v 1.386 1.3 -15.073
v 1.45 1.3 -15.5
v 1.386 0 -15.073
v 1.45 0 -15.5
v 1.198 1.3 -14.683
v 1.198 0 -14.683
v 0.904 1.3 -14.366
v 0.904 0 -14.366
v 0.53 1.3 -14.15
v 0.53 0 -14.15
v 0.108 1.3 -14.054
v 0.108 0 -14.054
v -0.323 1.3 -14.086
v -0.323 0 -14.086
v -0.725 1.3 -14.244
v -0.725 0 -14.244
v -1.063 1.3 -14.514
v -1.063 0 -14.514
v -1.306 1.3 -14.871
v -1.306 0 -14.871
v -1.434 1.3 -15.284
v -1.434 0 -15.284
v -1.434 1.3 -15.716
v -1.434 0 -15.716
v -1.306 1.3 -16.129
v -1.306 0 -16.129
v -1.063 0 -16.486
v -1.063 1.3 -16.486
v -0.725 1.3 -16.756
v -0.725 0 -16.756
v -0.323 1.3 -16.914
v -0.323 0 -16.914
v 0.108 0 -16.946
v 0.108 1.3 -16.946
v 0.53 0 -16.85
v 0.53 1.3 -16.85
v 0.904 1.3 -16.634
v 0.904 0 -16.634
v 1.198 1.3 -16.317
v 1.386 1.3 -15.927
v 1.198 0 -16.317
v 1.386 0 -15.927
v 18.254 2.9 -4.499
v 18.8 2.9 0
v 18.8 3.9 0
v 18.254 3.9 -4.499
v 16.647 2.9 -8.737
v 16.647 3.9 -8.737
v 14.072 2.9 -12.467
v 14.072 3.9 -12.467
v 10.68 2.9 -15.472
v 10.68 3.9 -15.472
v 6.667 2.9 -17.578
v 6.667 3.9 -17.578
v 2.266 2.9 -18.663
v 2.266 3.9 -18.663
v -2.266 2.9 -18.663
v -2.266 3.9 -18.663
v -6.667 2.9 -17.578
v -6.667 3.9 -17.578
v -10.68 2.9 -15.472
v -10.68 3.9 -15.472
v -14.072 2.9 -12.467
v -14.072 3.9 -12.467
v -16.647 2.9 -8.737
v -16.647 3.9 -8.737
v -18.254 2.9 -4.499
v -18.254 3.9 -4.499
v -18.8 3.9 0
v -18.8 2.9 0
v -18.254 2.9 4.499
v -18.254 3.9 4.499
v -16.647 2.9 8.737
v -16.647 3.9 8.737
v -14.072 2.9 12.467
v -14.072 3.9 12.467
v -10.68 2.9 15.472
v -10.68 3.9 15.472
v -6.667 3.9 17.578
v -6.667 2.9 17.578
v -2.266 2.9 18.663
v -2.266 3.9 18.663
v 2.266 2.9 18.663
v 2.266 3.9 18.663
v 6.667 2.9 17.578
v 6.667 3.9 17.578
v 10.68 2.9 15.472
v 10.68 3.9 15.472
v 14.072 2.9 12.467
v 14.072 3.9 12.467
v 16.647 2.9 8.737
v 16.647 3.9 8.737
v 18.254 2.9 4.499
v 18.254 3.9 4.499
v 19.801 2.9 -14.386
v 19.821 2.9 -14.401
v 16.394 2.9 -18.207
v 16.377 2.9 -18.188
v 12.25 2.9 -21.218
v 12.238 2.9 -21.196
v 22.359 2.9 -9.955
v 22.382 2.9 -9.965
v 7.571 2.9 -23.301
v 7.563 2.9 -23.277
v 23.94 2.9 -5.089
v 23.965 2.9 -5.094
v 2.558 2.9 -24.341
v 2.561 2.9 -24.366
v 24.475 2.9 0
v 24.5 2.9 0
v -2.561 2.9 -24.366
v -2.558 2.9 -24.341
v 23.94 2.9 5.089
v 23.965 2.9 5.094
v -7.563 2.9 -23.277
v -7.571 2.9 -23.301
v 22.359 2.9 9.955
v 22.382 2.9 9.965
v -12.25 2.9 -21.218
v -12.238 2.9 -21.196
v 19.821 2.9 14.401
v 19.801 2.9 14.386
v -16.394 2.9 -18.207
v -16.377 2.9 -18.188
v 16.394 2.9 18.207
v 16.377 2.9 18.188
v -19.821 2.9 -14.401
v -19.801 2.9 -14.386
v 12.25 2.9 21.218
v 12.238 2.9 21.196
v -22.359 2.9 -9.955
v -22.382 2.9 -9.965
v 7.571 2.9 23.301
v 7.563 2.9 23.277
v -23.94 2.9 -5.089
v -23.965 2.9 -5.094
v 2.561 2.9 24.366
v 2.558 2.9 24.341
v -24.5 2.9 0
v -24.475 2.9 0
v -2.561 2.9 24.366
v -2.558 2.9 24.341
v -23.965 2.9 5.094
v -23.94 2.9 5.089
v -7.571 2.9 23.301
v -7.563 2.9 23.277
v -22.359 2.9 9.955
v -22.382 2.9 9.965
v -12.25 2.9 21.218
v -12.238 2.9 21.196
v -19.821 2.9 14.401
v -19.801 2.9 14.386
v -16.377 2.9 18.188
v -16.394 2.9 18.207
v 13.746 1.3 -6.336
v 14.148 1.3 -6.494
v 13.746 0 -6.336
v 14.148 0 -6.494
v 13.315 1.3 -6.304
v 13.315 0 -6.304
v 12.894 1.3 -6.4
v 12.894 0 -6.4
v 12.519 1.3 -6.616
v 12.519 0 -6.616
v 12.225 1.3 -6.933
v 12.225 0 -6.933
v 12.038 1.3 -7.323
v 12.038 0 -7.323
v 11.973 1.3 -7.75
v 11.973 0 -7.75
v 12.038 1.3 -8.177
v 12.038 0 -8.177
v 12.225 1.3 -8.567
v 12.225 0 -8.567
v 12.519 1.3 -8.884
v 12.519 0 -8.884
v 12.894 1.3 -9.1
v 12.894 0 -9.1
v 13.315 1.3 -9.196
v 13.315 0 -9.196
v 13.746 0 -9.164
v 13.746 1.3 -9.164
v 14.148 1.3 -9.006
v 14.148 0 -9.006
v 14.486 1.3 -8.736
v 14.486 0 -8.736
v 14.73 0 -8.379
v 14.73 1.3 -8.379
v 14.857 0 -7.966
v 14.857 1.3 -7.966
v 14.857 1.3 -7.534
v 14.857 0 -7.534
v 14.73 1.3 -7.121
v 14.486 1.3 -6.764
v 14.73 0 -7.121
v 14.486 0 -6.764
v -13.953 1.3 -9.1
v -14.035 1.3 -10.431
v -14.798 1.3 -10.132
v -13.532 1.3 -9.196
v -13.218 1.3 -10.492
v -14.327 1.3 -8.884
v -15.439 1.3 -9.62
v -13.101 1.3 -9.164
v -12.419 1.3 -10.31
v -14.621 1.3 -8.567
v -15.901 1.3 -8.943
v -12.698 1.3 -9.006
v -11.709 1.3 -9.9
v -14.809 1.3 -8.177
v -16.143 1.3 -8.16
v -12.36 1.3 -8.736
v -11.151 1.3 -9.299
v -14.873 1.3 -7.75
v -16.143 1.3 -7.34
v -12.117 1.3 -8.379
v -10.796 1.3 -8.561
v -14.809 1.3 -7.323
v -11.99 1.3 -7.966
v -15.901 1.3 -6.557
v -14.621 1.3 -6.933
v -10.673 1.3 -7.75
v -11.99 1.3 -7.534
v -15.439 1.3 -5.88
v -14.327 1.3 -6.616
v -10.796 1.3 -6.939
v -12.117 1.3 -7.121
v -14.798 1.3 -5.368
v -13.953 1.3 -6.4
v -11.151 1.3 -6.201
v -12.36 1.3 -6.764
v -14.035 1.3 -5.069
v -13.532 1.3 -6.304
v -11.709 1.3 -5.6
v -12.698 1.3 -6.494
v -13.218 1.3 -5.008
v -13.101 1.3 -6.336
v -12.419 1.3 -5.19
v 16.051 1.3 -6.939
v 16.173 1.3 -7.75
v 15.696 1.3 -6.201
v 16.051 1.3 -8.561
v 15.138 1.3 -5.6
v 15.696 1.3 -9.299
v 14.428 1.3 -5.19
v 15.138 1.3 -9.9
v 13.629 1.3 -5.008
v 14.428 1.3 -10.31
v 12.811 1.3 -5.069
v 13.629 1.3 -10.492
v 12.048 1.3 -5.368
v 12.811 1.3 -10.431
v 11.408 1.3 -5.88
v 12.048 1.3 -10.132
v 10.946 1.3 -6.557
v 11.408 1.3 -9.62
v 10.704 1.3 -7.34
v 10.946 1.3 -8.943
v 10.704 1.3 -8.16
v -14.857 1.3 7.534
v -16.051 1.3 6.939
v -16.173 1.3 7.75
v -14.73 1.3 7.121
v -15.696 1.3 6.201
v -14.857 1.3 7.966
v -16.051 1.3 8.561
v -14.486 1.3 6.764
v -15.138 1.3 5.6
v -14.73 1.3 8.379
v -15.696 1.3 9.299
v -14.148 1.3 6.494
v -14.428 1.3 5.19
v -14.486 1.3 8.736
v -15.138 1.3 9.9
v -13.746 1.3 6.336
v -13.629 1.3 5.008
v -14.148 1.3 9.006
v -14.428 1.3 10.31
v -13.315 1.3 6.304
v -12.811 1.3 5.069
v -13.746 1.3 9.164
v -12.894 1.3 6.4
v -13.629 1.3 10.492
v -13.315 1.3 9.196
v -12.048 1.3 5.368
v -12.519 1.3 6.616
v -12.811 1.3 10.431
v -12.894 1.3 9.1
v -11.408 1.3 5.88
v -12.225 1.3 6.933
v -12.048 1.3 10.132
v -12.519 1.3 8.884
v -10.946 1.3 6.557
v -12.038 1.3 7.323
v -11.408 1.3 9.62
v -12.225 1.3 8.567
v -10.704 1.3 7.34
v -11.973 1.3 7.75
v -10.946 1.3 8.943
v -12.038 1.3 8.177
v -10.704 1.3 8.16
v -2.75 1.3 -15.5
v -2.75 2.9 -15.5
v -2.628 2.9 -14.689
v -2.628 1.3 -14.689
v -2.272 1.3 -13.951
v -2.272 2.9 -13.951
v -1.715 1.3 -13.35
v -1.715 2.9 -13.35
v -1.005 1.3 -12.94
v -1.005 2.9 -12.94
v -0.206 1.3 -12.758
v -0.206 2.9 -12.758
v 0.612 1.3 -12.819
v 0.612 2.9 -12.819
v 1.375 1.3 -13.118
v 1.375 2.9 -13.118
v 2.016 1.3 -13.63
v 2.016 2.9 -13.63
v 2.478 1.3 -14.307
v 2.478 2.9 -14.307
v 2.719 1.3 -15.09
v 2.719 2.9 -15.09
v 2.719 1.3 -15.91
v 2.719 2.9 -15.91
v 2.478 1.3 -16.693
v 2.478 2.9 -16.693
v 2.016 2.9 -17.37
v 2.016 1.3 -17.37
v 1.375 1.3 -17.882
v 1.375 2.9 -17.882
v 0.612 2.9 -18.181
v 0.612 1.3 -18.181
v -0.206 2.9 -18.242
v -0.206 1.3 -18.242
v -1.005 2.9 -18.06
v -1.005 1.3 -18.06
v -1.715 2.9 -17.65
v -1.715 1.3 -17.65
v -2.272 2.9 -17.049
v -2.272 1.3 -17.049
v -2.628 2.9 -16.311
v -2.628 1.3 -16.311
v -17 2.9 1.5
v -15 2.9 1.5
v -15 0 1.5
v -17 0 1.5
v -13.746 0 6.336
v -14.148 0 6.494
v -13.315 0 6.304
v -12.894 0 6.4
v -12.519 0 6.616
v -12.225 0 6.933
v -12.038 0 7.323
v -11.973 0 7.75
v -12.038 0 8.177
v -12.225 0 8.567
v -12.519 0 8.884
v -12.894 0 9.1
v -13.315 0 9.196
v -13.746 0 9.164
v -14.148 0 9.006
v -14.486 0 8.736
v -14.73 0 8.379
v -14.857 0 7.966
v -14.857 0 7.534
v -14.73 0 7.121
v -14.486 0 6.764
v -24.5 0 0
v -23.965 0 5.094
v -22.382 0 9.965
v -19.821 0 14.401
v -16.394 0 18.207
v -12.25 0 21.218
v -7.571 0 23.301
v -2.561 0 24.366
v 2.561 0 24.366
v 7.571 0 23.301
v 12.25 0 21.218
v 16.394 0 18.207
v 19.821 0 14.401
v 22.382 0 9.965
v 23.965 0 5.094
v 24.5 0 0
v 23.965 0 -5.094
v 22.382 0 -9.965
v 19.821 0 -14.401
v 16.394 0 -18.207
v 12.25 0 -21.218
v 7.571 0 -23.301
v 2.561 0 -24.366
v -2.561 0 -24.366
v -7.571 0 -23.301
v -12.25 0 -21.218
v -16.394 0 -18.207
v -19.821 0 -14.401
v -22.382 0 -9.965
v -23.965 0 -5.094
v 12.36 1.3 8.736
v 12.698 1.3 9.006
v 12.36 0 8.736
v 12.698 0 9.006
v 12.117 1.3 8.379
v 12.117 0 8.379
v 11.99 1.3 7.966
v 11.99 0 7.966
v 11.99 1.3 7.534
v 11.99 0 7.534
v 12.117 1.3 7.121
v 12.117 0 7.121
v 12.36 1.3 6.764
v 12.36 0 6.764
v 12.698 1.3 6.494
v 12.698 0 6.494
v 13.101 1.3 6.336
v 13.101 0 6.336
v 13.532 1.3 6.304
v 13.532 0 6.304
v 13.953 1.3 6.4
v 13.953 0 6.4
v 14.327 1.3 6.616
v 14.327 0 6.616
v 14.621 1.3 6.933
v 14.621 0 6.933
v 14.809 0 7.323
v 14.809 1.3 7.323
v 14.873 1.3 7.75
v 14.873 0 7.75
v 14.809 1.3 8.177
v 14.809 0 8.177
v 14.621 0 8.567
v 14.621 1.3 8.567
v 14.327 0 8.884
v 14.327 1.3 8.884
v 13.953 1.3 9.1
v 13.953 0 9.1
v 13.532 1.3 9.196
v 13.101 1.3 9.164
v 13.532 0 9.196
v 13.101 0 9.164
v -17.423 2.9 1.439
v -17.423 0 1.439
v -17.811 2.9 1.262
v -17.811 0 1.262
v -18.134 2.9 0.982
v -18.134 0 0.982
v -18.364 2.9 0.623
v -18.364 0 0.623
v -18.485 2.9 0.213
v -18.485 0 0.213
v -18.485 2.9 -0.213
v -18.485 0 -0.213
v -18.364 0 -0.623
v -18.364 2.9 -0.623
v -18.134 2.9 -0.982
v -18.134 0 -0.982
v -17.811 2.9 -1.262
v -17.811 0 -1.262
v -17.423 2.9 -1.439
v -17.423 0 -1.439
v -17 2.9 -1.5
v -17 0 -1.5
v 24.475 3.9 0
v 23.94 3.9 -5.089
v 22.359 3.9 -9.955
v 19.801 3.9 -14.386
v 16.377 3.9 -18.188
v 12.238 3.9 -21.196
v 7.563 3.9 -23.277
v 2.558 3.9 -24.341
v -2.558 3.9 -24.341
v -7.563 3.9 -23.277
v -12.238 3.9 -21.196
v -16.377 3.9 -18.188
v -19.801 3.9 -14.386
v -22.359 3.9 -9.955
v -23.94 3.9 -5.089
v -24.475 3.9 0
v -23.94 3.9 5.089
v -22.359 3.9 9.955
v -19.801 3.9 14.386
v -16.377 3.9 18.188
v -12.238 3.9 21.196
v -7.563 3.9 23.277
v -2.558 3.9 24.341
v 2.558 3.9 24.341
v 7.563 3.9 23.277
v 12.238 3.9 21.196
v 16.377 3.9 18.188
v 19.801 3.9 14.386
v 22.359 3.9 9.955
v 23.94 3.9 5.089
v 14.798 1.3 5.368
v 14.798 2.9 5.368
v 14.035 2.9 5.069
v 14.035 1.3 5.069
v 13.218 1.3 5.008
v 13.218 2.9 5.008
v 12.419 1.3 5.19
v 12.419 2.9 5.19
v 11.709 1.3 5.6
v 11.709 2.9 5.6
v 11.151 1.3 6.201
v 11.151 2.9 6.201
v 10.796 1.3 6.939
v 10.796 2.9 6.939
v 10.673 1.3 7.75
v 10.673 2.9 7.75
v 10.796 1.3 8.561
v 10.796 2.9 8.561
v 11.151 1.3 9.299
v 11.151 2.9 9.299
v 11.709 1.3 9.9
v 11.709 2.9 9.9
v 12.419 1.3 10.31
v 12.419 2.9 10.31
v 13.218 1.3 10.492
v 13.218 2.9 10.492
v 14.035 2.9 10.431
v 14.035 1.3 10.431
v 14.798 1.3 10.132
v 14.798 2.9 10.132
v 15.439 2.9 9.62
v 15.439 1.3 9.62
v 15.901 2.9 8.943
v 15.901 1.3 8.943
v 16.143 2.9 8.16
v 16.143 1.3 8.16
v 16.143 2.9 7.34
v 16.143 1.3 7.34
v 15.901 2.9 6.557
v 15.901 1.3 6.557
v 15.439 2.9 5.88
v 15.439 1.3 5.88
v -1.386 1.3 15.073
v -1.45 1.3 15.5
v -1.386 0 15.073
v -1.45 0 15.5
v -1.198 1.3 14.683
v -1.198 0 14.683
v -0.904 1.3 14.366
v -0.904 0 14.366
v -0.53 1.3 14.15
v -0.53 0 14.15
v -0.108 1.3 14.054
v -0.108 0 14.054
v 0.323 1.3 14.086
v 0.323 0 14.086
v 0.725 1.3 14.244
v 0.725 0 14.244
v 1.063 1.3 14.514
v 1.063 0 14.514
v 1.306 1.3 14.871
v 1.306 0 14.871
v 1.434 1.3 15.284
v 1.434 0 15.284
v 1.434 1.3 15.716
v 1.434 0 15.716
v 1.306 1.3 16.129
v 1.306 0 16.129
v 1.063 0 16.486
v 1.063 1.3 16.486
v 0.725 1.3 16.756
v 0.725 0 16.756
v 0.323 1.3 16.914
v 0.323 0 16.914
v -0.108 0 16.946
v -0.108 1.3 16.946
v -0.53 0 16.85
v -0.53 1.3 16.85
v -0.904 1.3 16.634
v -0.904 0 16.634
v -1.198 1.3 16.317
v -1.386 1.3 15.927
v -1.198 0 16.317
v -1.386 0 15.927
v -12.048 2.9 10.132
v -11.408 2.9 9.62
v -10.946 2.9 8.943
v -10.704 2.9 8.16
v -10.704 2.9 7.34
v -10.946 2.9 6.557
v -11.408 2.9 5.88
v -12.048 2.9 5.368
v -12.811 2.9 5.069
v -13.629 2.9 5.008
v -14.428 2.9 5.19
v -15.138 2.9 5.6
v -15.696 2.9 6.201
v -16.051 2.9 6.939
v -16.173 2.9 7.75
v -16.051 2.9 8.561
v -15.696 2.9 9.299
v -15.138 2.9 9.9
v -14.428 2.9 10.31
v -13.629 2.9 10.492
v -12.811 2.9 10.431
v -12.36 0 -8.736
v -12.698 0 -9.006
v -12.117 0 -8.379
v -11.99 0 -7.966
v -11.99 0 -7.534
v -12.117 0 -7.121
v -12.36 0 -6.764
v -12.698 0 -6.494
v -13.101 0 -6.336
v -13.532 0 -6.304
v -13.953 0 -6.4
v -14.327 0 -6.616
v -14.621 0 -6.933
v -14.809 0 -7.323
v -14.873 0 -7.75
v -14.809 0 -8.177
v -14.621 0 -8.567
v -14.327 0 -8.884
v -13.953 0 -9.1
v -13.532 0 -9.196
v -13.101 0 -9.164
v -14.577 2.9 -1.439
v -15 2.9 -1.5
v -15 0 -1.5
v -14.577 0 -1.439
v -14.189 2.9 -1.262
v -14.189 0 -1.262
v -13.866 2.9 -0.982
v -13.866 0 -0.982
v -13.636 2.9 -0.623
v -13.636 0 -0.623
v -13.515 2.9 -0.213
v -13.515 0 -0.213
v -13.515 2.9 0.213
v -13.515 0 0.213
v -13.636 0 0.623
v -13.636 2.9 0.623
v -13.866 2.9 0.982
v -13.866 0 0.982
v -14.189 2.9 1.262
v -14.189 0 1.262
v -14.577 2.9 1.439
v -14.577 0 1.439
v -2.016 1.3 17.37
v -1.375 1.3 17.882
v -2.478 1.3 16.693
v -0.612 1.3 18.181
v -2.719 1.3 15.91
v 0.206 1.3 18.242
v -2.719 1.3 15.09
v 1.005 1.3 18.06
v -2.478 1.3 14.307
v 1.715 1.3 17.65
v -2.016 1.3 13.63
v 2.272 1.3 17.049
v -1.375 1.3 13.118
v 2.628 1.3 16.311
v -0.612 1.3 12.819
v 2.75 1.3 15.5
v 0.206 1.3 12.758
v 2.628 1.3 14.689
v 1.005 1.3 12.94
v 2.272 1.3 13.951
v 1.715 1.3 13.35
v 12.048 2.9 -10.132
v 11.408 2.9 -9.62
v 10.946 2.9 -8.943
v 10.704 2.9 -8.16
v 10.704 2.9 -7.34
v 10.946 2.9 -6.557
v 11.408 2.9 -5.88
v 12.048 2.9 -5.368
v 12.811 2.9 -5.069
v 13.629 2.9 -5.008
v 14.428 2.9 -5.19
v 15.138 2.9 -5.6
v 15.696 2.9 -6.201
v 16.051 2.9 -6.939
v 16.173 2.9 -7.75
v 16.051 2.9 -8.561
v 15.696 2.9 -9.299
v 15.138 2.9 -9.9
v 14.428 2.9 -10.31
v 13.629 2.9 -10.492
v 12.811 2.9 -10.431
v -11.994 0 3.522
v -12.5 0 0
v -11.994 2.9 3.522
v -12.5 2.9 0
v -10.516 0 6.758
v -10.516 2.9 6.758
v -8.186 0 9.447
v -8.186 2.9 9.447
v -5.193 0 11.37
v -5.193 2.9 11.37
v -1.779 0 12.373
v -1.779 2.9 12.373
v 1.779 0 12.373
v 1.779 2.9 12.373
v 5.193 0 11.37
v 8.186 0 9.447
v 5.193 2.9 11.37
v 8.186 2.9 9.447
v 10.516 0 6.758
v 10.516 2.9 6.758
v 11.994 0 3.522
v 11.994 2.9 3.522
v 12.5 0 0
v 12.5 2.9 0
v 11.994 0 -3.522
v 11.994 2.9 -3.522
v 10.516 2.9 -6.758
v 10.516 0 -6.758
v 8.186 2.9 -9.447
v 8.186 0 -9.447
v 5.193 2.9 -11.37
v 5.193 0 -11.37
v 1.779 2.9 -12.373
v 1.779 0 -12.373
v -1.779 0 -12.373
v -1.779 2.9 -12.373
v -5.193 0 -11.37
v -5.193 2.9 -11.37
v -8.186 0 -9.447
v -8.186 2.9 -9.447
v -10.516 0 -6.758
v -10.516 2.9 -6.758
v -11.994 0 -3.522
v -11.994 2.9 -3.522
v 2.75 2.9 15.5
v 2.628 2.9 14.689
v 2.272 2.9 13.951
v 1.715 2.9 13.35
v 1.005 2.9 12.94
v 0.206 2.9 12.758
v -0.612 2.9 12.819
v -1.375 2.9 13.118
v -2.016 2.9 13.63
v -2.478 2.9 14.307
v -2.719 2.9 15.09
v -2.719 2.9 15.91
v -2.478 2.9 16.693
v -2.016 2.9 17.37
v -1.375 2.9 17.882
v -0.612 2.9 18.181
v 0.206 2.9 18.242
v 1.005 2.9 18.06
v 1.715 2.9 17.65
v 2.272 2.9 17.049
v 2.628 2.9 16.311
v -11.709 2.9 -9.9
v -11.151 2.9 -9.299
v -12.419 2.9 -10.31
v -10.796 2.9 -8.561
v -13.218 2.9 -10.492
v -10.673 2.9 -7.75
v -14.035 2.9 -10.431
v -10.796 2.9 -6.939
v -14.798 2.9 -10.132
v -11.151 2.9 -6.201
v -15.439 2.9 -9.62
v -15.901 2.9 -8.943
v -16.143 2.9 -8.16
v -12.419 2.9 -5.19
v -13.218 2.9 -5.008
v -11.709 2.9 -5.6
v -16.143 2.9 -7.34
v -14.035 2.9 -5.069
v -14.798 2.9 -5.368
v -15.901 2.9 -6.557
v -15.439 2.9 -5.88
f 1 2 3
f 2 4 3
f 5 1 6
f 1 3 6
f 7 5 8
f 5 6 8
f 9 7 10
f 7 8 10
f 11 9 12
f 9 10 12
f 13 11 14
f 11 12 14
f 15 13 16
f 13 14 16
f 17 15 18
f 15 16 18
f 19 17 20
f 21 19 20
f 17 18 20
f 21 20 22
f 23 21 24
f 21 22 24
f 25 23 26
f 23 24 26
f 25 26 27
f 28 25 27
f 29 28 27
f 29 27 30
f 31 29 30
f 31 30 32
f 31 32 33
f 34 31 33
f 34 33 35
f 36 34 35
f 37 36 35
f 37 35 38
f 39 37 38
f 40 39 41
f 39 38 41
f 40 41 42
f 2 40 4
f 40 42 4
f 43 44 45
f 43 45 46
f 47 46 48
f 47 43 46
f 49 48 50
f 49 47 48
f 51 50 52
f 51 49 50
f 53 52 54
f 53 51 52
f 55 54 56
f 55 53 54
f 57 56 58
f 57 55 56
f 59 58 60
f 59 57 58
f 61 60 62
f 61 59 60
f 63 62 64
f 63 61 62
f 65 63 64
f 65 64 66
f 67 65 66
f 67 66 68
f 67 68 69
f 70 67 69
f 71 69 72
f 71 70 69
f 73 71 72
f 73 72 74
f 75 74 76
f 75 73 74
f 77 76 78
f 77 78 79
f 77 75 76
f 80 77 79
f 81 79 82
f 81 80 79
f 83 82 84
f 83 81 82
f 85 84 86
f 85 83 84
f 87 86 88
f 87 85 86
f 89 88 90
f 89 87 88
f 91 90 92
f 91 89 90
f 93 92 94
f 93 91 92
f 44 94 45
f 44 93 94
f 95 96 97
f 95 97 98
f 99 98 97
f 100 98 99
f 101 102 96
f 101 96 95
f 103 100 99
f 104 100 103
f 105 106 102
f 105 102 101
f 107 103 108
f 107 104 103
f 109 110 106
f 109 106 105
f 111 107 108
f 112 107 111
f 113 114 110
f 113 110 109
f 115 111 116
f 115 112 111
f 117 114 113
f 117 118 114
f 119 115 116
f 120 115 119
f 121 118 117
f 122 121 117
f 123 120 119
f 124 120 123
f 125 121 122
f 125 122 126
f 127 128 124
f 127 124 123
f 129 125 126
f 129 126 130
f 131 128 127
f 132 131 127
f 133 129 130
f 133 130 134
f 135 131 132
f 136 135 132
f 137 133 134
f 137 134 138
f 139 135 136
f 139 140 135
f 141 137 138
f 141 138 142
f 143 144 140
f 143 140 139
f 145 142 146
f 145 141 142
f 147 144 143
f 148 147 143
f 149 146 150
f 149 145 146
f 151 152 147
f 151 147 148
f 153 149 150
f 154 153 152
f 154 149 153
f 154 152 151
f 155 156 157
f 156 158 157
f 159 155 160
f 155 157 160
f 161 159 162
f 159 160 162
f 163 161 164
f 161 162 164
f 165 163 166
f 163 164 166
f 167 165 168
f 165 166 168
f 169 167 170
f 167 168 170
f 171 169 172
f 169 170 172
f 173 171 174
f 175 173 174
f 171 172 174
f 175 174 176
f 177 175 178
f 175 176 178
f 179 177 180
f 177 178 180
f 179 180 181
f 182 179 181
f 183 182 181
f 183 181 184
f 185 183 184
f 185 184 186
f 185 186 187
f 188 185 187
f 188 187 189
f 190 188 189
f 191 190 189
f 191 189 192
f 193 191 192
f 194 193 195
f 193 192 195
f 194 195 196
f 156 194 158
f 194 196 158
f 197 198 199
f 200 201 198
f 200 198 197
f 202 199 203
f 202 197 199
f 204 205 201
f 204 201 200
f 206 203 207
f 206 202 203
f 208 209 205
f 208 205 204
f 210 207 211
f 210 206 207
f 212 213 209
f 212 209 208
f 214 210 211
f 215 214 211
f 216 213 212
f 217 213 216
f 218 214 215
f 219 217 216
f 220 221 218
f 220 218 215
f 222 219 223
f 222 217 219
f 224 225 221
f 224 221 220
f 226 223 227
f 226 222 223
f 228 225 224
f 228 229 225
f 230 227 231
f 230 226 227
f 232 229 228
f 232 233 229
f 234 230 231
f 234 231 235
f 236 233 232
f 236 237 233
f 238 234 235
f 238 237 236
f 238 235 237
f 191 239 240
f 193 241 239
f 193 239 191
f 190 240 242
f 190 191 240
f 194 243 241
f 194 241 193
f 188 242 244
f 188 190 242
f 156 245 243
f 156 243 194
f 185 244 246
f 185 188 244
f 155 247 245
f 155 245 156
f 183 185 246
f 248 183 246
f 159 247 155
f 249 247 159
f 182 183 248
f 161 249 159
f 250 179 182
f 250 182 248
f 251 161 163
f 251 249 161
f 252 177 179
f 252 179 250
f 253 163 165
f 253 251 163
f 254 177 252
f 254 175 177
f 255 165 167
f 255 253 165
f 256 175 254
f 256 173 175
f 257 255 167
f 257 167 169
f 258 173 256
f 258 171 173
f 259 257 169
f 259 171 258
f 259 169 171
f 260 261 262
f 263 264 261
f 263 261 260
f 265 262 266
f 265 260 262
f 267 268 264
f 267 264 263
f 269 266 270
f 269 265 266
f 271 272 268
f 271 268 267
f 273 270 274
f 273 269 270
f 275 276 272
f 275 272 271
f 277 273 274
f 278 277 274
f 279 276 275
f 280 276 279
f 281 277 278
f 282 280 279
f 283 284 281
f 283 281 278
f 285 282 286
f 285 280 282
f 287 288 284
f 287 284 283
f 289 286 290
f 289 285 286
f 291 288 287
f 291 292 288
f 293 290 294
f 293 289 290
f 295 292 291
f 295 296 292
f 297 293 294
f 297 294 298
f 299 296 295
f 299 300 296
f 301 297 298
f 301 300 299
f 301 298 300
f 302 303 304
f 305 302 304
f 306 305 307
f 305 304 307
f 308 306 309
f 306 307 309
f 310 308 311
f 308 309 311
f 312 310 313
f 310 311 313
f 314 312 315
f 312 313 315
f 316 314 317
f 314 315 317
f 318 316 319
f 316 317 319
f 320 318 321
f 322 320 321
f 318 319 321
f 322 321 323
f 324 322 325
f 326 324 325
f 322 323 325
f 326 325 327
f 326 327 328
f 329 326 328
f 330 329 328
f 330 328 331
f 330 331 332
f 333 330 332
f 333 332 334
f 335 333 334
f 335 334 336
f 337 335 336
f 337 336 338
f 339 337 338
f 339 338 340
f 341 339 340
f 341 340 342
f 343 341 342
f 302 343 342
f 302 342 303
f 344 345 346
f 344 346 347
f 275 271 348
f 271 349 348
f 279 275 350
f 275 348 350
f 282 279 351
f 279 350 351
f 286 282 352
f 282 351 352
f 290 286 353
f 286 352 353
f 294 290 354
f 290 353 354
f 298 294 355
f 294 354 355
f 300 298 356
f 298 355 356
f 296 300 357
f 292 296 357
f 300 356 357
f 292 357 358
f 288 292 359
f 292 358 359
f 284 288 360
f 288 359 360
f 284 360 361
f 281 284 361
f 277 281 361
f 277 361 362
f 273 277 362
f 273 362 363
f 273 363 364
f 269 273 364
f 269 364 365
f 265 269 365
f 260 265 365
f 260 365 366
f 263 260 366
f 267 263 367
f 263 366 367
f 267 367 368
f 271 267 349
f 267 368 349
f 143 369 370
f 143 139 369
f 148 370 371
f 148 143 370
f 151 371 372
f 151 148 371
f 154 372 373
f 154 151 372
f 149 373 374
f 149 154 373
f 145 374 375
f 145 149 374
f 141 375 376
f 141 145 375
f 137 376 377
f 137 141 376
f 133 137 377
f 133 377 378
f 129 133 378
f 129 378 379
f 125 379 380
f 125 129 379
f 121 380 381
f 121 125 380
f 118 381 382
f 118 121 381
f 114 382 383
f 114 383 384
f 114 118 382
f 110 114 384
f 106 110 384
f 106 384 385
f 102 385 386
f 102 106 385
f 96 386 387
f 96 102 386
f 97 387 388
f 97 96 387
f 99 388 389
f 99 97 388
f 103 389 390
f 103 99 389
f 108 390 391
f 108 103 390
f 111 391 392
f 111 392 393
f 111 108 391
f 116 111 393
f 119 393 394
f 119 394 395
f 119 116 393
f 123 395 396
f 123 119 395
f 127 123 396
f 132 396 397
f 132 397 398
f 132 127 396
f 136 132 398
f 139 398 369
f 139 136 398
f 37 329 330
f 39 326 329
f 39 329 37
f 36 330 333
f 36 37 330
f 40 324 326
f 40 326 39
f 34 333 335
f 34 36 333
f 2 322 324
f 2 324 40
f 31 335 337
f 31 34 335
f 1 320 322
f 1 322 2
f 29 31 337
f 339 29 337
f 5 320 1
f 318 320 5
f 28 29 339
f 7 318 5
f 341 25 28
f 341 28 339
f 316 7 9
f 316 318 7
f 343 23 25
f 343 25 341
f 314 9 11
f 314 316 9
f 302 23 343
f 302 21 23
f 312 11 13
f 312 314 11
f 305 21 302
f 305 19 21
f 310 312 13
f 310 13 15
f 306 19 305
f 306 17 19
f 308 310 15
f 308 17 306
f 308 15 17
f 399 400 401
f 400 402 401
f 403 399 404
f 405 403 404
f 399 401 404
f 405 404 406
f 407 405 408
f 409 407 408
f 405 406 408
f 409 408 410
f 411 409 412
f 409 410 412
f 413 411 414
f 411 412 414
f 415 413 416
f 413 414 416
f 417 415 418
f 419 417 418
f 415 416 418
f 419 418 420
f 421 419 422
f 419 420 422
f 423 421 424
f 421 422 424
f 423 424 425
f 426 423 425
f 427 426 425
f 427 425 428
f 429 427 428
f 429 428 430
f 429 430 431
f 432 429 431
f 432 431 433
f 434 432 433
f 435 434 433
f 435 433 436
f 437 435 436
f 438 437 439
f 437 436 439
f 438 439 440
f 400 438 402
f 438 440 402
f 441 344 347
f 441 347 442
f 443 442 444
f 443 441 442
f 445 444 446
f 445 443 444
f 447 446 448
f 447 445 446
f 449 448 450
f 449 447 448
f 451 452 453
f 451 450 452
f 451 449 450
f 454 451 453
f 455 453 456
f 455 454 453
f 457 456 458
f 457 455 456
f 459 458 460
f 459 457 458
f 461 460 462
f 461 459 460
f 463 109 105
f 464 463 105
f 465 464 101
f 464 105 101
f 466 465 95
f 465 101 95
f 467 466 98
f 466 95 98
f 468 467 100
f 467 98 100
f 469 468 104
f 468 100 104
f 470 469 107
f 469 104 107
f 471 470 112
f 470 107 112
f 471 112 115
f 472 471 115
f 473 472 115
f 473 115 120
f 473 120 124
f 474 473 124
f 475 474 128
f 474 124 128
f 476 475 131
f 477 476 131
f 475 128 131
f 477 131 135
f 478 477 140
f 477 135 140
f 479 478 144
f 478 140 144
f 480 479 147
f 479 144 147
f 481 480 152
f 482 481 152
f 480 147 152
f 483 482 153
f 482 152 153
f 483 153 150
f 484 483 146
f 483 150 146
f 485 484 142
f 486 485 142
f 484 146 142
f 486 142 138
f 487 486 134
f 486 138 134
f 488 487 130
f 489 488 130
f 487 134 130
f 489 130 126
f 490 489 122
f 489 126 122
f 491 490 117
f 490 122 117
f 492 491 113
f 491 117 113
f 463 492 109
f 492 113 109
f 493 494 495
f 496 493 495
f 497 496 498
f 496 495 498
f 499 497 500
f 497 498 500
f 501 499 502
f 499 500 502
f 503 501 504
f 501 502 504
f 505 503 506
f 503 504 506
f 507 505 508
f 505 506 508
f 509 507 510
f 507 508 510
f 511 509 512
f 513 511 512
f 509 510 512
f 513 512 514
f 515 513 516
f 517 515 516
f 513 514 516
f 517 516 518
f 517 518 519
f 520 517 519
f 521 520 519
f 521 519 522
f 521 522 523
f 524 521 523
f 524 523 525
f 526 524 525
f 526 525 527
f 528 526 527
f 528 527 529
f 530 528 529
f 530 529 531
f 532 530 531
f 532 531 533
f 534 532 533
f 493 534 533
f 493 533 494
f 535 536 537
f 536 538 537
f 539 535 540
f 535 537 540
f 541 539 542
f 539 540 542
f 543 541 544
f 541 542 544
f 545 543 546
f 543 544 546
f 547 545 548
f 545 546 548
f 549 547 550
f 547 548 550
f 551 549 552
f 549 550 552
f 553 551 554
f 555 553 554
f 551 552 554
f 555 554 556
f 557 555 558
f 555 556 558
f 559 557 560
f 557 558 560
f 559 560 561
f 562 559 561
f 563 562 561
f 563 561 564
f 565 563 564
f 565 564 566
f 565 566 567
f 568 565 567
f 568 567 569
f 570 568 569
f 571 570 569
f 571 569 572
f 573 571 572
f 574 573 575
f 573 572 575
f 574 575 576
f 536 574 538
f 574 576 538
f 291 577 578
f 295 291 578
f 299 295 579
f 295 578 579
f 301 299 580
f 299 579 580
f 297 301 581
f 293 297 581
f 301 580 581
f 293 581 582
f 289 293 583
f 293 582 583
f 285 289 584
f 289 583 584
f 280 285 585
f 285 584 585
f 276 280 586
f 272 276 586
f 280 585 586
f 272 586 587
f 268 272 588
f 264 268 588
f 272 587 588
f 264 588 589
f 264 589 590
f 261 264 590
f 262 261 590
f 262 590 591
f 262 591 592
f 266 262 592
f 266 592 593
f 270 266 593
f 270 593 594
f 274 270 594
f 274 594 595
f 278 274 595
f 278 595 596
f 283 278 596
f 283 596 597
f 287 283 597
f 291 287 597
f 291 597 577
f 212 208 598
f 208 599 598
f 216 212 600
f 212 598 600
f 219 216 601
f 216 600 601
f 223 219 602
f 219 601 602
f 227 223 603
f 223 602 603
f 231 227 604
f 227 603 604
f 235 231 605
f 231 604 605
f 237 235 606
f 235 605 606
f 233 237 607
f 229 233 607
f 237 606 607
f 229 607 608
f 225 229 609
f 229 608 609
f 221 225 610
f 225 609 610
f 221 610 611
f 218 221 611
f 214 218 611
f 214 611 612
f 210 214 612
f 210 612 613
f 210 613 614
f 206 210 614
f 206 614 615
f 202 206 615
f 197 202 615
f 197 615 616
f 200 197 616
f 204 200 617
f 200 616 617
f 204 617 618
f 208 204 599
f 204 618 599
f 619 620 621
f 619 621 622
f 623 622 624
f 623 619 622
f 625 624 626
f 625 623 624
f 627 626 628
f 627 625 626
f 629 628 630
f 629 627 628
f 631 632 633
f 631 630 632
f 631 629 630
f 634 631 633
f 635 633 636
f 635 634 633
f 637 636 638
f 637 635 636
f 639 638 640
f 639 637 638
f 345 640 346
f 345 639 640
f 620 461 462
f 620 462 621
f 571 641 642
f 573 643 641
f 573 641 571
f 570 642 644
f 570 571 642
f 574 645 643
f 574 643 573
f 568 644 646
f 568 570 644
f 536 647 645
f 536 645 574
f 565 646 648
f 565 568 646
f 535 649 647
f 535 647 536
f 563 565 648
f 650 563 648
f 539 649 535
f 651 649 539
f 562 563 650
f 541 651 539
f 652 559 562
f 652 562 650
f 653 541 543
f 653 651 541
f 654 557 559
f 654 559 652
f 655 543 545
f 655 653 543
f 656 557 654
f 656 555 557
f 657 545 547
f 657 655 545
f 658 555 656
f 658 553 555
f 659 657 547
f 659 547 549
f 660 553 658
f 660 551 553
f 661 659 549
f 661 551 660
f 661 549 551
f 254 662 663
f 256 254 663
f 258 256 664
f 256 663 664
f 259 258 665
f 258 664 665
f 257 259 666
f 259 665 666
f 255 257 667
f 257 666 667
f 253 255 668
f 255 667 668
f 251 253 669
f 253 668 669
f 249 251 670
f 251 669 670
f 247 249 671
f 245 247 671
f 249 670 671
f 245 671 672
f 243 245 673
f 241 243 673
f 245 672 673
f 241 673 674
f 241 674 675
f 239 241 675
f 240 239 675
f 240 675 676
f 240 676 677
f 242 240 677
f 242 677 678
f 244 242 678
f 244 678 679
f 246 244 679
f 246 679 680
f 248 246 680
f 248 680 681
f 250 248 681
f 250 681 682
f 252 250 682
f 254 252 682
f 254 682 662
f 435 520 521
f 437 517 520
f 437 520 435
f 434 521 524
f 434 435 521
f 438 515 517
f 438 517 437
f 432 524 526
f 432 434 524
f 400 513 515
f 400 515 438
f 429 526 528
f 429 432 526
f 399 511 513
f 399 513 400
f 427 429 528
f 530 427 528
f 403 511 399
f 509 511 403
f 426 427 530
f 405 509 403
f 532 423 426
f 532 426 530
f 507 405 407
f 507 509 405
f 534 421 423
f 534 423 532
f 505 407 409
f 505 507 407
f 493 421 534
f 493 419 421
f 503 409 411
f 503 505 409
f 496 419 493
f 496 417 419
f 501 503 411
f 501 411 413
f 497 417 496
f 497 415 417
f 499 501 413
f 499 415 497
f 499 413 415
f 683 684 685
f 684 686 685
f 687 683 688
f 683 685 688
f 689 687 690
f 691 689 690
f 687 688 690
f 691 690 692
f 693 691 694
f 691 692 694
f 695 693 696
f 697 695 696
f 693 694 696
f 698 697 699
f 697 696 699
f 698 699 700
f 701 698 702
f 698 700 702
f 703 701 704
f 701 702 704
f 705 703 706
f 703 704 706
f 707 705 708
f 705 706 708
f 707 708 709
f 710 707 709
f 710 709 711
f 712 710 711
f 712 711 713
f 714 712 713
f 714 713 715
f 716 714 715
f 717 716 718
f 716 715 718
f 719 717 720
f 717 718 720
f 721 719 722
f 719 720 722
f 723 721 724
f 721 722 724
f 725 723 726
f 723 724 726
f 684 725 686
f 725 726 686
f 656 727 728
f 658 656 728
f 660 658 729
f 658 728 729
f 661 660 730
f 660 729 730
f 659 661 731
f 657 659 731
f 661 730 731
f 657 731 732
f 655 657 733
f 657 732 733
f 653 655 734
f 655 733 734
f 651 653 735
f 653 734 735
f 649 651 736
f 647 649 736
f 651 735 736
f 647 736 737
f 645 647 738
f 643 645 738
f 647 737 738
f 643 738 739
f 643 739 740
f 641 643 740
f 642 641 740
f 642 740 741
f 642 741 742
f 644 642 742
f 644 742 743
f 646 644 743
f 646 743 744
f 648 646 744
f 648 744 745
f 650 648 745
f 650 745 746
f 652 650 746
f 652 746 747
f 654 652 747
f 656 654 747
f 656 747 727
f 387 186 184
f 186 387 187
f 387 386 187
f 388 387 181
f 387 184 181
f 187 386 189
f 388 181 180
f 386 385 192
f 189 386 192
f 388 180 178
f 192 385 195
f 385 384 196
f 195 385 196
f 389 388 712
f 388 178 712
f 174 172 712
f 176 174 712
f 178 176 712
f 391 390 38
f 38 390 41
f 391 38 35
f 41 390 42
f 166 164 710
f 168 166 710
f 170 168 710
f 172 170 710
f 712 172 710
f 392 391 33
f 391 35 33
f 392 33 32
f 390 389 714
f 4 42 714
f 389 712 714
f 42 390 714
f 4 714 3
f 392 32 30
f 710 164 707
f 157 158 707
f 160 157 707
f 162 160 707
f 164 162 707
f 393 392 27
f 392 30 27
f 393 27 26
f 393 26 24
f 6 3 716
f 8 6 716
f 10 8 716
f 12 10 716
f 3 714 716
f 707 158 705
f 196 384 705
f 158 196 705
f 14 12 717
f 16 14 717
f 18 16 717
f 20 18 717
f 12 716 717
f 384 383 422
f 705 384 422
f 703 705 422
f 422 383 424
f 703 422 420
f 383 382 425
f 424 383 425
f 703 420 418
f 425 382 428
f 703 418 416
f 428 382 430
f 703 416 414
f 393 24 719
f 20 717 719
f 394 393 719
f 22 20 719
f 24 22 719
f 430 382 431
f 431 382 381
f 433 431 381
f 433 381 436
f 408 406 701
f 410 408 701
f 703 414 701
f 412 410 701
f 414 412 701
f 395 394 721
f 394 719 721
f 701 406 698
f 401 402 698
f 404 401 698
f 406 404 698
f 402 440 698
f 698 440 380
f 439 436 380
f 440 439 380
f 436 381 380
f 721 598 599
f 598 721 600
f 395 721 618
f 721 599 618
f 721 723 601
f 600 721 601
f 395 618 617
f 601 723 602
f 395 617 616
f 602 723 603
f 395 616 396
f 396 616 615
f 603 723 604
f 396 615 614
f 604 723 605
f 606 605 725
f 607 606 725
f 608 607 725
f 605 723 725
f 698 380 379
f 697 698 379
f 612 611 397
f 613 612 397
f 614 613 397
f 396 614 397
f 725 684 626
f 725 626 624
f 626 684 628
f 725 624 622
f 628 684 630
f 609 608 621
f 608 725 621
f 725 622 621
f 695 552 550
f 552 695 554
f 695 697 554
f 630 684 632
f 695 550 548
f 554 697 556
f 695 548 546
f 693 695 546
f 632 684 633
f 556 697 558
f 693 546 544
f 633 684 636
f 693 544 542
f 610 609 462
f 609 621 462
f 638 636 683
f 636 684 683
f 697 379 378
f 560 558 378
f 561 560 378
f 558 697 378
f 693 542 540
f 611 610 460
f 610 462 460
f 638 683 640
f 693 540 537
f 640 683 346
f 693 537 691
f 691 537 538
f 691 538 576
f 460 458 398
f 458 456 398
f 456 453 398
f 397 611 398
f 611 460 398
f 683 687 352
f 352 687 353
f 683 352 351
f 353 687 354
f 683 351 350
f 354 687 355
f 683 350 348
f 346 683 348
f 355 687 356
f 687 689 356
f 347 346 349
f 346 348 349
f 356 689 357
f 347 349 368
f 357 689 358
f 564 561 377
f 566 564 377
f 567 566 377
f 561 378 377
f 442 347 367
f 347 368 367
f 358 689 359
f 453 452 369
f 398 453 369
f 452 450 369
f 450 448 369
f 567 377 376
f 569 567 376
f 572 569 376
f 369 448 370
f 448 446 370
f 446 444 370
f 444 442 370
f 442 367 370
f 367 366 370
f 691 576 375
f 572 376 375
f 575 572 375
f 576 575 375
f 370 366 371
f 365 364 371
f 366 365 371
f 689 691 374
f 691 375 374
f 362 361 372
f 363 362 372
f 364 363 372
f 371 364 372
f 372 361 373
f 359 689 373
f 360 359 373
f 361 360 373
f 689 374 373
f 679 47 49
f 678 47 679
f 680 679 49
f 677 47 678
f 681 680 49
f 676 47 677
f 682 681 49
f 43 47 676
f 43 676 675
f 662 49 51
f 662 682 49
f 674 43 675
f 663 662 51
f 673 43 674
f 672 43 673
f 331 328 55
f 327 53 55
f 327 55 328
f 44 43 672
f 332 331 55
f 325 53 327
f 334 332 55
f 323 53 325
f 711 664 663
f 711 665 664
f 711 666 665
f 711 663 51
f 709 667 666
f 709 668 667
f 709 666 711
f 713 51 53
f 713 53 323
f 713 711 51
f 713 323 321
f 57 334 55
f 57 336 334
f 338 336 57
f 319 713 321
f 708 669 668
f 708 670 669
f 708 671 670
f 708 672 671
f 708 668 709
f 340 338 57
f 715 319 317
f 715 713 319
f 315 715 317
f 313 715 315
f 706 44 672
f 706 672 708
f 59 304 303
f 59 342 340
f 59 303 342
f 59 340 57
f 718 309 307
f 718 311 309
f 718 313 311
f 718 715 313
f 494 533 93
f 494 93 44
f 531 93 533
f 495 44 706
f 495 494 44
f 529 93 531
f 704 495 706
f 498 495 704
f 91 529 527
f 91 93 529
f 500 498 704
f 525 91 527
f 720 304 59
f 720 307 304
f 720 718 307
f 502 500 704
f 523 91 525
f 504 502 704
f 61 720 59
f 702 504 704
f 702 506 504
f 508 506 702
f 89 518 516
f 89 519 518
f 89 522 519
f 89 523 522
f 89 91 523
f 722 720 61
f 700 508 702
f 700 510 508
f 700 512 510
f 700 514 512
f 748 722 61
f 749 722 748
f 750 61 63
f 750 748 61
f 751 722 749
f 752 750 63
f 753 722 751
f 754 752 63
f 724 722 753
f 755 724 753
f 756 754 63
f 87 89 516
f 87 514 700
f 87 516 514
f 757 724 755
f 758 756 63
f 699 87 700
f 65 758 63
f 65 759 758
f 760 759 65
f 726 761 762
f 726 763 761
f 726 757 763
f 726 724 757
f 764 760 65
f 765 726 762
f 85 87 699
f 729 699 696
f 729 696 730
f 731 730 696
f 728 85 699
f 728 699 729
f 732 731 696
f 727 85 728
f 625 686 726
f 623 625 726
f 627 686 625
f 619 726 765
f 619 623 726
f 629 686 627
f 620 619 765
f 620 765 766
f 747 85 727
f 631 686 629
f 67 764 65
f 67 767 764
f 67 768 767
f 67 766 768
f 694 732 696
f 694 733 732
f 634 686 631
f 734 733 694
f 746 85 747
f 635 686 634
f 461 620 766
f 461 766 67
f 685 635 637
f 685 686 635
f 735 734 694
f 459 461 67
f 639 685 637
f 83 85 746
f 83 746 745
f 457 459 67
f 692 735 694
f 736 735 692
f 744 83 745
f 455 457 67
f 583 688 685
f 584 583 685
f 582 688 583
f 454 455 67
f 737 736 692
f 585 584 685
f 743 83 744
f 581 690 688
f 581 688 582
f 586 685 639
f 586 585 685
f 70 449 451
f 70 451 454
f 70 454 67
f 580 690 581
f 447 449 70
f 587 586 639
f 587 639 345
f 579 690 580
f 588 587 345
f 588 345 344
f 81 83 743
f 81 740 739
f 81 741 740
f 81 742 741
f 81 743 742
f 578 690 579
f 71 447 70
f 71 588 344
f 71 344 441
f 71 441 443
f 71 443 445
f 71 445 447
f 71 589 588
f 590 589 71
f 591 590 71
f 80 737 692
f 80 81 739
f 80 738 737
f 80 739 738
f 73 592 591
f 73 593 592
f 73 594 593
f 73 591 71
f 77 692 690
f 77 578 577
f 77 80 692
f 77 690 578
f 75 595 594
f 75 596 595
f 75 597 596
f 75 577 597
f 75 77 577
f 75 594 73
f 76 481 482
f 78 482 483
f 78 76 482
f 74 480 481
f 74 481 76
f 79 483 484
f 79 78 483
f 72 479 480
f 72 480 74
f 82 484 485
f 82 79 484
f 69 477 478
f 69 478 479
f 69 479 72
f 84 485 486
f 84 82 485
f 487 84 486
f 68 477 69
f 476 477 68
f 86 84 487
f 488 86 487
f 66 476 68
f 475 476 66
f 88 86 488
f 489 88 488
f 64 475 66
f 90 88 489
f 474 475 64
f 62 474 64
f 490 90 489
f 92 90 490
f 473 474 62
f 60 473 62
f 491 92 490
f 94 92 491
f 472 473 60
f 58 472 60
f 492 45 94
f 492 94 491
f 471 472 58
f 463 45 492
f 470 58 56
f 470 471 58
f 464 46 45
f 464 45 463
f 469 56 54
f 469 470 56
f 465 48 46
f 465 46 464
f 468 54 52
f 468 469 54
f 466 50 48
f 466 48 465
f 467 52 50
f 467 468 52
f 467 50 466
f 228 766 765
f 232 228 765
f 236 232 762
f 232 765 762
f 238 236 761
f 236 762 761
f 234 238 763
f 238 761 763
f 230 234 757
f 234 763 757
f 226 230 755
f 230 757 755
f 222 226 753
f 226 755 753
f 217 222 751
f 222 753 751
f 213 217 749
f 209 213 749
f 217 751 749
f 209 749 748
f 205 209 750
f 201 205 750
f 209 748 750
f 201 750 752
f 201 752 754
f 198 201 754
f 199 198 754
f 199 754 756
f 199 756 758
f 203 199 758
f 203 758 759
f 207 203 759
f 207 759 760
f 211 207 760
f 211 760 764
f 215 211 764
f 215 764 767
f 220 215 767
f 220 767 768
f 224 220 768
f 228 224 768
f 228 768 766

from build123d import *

# Parameters (mm, degrees)
SKETCH1_W                                            = 12
SKETCH1_H                                            = 2.9
CBORE_FOR_M2_5_HEX_SOCKET_HEAD_CAP_SCREW_D           = 2.9
CBORE_FOR_M2_5_HEX_SOCKET_HEAD_CAP_SCREW_CBORE_D     = 5.5
CBORE_FOR_M2_5_HEX_SOCKET_HEAD_CAP_SCREW_CBORE_DEPTH = 2.1
CIRPATTERN1_COUNT                                    = 6
CUT_EXTRUDE4_DEPTH                                   = 3.9
SKETCH5_R                                            = 24.475
SKETCH5_R_2                                          = 18.8
BOSS_EXTRUDE1_DEPTH                                  = 1


with BuildPart() as part:
    # Sketch1 → Revolve1 (revolve)
    with BuildSketch(Plane.XY):
        with Locations((-18.5, 1.45)):
            Rectangle(SKETCH1_W, SKETCH1_H)
    revolve(axis=Axis((0, -3.243860323, 0), (0, 1, 0)))

    # CBORE for M2.5 Hex Socket Head Cap Screw2 (through all)
    with Locations(Plane(origin=(0, 3.4, 0), x_dir=(-1, 0, 0), z_dir=(0, 1, 0))):
        with Locations((0, -15.5)):
            cbore_for_m2_5_hex_socket_head_cap_screw = CounterBoreHole(CBORE_FOR_M2_5_HEX_SOCKET_HEAD_CAP_SCREW_D / 2, CBORE_FOR_M2_5_HEX_SOCKET_HEAD_CAP_SCREW_CBORE_D / 2, CBORE_FOR_M2_5_HEX_SOCKET_HEAD_CAP_SCREW_CBORE_DEPTH)

    # CirPattern1: CBORE for M2.5 Hex Socket Head Cap Screw2 ×6 about axis
    cirpattern1_axis = Axis((0, 0, 0), (0, 1, 0))
    for i in range(1, CIRPATTERN1_COUNT):
        add(cbore_for_m2_5_hex_socket_head_cap_screw.rotate(cirpattern1_axis, i * 360 / CIRPATTERN1_COUNT), mode=Mode.SUBTRACT)

    # Sketch10 → Cut-Extrude4 (cut, through all)
    with BuildSketch(Plane(origin=(0, 2.9, 0), x_dir=(1, 0, 0), z_dir=(0, 1, 0))):
        with BuildLine():
            Line((-15, -1.5), (-17, -1.5))
            ThreePointArc((-17, -1.5), (-18.5, 0), (-17, 1.5))
            Line((-17, 1.5), (-15, 1.5))
            ThreePointArc((-15, 1.5), (-13.5, 0), (-15, -1.5))
        make_face()
    extrude(amount=-CUT_EXTRUDE4_DEPTH, mode=Mode.SUBTRACT)

    # Sketch5 → Boss-Extrude1 (add)
    with BuildSketch(Plane(origin=(0, 2.9, 0), x_dir=(1, 0, 0), z_dir=(0, 1, 0))):
        Circle(SKETCH5_R)
        Circle(SKETCH5_R_2, mode=Mode.SUBTRACT)
    extrude(amount=BOSS_EXTRUDE1_DEPTH)


solid = part.part
